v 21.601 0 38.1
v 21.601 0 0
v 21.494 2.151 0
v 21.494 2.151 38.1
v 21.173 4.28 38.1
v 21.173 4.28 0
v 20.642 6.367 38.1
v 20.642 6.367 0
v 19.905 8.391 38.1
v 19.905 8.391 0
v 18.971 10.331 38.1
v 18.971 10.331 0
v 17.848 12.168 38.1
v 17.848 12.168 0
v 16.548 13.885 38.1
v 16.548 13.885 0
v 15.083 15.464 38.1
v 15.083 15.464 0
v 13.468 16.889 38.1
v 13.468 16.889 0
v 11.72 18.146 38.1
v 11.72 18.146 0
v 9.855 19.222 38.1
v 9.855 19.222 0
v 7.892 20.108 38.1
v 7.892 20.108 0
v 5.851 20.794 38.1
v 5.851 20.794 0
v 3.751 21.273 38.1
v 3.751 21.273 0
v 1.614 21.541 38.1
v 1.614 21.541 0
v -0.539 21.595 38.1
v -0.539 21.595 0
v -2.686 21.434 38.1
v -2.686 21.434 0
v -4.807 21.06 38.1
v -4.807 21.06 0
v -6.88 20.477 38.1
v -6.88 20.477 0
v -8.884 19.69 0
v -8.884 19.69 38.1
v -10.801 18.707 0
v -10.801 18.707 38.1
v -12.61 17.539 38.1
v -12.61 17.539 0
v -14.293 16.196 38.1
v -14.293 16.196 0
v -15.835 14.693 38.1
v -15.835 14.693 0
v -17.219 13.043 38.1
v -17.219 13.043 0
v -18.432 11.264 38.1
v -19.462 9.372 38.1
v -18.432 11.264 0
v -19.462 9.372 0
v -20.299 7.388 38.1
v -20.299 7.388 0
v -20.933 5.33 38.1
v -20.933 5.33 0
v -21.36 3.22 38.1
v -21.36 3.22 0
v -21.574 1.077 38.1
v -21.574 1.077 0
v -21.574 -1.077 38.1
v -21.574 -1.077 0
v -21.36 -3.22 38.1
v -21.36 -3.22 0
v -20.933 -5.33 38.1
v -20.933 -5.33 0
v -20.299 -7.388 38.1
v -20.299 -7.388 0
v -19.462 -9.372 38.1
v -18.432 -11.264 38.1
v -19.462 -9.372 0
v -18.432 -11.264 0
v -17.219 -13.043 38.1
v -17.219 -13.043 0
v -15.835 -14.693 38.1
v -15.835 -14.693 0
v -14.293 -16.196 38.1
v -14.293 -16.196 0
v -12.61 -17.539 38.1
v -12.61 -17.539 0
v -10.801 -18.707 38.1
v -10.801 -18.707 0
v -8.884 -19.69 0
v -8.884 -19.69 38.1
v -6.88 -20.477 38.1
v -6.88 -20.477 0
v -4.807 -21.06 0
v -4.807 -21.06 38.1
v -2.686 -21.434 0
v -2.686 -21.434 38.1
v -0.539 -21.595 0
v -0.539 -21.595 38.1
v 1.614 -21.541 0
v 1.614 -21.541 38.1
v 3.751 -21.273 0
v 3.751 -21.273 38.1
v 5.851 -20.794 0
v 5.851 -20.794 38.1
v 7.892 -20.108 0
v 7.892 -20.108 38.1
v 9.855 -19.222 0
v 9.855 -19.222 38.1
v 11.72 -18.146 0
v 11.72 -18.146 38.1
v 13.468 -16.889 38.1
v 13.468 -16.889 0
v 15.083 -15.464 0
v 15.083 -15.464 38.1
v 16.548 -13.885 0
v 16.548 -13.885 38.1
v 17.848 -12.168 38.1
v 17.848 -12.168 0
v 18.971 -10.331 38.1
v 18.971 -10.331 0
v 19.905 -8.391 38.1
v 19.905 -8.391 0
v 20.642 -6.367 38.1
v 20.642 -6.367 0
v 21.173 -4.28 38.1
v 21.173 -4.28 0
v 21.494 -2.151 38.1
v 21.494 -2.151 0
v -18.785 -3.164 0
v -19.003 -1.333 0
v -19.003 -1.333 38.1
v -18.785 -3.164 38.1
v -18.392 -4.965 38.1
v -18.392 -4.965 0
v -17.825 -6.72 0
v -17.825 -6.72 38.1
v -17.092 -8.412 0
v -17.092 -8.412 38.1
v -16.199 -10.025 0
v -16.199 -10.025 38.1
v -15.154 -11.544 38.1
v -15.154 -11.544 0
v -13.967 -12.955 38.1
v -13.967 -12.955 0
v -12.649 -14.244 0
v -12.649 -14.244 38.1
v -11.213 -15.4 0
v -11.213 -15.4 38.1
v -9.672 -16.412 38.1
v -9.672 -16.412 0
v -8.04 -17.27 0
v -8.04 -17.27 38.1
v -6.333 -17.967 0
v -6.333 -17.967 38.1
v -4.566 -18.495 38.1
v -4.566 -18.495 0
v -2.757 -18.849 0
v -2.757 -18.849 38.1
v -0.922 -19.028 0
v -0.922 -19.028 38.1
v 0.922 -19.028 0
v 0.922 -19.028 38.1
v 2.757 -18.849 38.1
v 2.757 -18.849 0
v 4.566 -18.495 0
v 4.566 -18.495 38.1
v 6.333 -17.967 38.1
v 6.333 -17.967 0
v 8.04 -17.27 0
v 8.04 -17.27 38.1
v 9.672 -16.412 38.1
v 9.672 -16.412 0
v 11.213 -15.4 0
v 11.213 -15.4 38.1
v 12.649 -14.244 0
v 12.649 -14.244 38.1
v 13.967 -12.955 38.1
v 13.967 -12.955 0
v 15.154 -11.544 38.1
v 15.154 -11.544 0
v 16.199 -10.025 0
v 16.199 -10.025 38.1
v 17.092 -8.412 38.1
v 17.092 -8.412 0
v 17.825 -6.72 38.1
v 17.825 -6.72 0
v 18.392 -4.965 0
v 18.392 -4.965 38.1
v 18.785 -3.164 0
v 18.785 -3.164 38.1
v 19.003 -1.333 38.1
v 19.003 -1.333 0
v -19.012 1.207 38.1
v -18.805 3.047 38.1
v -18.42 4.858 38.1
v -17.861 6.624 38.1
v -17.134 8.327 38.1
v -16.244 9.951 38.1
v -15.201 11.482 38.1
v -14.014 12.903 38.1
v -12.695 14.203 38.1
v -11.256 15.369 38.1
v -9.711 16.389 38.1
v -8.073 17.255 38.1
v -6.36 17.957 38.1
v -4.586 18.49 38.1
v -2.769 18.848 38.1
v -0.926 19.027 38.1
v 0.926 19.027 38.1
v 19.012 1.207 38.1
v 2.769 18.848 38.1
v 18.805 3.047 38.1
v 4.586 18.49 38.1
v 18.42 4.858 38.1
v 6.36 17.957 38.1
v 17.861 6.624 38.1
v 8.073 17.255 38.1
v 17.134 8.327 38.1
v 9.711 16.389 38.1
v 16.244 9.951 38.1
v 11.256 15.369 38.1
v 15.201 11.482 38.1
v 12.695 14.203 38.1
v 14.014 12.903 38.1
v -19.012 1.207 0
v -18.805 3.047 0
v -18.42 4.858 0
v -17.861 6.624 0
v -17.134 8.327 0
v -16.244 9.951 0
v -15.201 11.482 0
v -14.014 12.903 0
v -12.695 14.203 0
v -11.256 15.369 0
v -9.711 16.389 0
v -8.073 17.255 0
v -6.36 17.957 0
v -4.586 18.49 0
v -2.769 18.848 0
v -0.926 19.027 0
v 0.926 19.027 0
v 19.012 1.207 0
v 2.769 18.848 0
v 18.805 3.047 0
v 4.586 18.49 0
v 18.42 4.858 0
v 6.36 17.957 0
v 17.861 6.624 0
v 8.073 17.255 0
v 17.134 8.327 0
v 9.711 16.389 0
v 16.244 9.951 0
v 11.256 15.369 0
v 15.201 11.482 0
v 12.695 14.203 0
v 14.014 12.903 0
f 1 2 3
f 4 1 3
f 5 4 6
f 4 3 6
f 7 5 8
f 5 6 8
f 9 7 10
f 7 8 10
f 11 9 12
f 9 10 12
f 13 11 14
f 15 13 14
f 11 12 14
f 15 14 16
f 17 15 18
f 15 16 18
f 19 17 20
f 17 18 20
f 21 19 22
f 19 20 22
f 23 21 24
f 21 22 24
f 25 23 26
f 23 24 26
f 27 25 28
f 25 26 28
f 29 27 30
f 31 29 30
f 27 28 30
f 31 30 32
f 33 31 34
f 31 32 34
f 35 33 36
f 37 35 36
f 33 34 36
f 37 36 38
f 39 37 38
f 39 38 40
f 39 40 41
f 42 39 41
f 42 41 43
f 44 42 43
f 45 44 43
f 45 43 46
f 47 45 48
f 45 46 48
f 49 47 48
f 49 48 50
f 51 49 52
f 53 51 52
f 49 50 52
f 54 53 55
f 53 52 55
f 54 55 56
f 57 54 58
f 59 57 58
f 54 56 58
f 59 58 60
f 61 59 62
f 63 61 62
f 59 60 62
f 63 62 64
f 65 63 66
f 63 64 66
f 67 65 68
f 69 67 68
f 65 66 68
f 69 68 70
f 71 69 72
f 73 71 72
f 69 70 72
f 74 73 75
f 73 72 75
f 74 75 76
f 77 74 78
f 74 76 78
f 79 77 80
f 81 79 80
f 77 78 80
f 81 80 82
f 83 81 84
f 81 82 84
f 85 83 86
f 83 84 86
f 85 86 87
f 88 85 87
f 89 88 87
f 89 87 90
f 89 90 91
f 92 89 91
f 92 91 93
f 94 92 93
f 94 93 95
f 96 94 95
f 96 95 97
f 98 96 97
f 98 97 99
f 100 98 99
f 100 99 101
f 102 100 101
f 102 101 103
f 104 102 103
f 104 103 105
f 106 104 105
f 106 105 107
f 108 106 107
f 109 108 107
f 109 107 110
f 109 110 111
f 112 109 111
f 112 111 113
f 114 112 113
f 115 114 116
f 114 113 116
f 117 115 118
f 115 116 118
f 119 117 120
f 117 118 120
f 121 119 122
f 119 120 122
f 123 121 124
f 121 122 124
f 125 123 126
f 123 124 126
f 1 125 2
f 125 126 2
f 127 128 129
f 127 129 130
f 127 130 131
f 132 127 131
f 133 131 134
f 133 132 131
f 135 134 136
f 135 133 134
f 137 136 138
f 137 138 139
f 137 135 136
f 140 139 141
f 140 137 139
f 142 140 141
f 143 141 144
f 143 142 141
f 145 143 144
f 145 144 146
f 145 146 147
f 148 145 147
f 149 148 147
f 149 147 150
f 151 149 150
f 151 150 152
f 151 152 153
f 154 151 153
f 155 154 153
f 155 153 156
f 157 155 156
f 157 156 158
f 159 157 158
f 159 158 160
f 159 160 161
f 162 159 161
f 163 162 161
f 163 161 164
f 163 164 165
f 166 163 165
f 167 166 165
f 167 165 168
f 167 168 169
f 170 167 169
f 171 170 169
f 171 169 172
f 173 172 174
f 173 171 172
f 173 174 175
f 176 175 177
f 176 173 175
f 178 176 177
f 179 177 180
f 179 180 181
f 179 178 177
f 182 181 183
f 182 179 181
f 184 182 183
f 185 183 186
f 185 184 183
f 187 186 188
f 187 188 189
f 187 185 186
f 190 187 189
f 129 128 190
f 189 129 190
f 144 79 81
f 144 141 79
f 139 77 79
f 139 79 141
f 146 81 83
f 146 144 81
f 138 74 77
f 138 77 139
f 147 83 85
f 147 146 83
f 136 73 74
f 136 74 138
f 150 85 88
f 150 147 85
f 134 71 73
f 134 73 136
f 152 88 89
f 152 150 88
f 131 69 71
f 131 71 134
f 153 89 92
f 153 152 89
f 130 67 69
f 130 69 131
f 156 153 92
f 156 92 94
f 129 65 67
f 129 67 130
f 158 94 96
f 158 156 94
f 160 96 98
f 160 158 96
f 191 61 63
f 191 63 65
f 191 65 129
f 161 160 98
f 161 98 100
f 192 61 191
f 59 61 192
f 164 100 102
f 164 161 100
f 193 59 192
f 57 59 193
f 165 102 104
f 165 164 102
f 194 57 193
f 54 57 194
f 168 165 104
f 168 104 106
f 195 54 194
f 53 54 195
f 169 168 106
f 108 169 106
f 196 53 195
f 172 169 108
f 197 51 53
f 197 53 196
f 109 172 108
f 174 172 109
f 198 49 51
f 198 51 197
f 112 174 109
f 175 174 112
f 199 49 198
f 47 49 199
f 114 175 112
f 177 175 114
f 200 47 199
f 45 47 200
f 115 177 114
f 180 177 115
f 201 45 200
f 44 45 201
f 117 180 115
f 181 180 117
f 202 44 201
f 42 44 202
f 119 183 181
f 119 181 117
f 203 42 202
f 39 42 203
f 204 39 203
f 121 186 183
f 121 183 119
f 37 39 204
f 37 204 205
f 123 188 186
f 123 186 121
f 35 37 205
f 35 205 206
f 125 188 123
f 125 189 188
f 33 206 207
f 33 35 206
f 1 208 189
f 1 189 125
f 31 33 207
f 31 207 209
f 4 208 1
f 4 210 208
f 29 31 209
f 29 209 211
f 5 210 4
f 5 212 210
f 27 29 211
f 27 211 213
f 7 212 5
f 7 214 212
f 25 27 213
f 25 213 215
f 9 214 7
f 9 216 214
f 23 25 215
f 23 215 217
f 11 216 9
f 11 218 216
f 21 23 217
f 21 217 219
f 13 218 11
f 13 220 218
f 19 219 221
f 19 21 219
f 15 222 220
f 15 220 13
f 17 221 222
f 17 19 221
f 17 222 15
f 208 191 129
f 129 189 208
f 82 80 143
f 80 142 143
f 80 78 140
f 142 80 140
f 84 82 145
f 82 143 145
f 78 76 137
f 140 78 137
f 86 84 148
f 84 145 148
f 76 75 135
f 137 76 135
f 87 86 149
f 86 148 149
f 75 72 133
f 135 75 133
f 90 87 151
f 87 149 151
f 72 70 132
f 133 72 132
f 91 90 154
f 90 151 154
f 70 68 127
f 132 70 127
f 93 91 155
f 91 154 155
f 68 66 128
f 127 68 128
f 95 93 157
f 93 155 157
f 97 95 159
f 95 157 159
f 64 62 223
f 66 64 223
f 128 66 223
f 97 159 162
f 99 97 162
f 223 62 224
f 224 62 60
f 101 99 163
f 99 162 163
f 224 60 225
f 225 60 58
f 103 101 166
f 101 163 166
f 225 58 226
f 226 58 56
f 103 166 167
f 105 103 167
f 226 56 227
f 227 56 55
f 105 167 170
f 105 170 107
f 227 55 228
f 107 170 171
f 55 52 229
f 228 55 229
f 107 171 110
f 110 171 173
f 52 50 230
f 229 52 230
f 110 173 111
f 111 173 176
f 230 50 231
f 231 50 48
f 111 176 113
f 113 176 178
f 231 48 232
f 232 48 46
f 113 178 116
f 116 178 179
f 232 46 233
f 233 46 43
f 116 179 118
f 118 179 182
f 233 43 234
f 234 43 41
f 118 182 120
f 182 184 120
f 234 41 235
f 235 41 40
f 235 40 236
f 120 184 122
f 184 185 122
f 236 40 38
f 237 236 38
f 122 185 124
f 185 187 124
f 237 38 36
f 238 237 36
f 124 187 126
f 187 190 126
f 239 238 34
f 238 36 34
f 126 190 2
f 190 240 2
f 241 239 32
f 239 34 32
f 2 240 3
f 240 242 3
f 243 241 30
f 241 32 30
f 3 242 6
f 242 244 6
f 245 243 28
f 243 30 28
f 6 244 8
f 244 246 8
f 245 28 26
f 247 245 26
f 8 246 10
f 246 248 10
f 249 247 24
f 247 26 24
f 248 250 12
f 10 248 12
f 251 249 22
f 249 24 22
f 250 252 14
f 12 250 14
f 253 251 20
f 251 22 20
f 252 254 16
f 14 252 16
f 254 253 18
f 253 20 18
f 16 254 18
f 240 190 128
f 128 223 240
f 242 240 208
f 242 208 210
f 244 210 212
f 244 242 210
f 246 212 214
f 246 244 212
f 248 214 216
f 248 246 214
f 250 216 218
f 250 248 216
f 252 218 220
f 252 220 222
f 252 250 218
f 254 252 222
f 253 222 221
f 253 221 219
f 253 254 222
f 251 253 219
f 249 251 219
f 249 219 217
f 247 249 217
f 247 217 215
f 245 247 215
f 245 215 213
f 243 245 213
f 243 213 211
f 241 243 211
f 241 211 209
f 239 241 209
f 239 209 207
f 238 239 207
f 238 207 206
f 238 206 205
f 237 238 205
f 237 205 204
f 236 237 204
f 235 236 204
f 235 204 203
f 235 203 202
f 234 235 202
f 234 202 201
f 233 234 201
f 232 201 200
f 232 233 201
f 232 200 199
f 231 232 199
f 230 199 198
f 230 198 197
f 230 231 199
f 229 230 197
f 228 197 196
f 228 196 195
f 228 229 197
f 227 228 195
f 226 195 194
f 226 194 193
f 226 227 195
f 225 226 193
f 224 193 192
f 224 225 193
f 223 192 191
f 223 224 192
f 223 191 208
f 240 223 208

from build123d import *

# Parameters (mm, degrees)
F0_R     = 19.05
F0_R_2   = 21.601346
F1_DEPTH = 38.1
F2_DEPTH = 76.2
F3_W     = 40.27349
F3_H     = 2.54
F4_DEPTH = 38.1


with BuildPart() as f1:
    # F0 (on Top) → F1 (new body)
    with BuildSketch(Plane.XY):
        Circle(F0_R)
        Circle(F0_R_2)
        Circle(F0_R, mode=Mode.SUBTRACT)
    extrude(amount=F1_DEPTH)

    # F0 (on Top) → F2 (cut)
    with BuildSketch(Plane.XY):
        Circle(F0_R)
    extrude(amount=F2_DEPTH, mode=Mode.SUBTRACT)

    # F3 (on face) → F4 (join)
    with BuildSketch(Plane.XY):
        with Locations((-0.148629, -0.063356)):
            Rectangle(F3_W, F3_H)
    extrude(amount=F4_DEPTH)


solid = f1.part
